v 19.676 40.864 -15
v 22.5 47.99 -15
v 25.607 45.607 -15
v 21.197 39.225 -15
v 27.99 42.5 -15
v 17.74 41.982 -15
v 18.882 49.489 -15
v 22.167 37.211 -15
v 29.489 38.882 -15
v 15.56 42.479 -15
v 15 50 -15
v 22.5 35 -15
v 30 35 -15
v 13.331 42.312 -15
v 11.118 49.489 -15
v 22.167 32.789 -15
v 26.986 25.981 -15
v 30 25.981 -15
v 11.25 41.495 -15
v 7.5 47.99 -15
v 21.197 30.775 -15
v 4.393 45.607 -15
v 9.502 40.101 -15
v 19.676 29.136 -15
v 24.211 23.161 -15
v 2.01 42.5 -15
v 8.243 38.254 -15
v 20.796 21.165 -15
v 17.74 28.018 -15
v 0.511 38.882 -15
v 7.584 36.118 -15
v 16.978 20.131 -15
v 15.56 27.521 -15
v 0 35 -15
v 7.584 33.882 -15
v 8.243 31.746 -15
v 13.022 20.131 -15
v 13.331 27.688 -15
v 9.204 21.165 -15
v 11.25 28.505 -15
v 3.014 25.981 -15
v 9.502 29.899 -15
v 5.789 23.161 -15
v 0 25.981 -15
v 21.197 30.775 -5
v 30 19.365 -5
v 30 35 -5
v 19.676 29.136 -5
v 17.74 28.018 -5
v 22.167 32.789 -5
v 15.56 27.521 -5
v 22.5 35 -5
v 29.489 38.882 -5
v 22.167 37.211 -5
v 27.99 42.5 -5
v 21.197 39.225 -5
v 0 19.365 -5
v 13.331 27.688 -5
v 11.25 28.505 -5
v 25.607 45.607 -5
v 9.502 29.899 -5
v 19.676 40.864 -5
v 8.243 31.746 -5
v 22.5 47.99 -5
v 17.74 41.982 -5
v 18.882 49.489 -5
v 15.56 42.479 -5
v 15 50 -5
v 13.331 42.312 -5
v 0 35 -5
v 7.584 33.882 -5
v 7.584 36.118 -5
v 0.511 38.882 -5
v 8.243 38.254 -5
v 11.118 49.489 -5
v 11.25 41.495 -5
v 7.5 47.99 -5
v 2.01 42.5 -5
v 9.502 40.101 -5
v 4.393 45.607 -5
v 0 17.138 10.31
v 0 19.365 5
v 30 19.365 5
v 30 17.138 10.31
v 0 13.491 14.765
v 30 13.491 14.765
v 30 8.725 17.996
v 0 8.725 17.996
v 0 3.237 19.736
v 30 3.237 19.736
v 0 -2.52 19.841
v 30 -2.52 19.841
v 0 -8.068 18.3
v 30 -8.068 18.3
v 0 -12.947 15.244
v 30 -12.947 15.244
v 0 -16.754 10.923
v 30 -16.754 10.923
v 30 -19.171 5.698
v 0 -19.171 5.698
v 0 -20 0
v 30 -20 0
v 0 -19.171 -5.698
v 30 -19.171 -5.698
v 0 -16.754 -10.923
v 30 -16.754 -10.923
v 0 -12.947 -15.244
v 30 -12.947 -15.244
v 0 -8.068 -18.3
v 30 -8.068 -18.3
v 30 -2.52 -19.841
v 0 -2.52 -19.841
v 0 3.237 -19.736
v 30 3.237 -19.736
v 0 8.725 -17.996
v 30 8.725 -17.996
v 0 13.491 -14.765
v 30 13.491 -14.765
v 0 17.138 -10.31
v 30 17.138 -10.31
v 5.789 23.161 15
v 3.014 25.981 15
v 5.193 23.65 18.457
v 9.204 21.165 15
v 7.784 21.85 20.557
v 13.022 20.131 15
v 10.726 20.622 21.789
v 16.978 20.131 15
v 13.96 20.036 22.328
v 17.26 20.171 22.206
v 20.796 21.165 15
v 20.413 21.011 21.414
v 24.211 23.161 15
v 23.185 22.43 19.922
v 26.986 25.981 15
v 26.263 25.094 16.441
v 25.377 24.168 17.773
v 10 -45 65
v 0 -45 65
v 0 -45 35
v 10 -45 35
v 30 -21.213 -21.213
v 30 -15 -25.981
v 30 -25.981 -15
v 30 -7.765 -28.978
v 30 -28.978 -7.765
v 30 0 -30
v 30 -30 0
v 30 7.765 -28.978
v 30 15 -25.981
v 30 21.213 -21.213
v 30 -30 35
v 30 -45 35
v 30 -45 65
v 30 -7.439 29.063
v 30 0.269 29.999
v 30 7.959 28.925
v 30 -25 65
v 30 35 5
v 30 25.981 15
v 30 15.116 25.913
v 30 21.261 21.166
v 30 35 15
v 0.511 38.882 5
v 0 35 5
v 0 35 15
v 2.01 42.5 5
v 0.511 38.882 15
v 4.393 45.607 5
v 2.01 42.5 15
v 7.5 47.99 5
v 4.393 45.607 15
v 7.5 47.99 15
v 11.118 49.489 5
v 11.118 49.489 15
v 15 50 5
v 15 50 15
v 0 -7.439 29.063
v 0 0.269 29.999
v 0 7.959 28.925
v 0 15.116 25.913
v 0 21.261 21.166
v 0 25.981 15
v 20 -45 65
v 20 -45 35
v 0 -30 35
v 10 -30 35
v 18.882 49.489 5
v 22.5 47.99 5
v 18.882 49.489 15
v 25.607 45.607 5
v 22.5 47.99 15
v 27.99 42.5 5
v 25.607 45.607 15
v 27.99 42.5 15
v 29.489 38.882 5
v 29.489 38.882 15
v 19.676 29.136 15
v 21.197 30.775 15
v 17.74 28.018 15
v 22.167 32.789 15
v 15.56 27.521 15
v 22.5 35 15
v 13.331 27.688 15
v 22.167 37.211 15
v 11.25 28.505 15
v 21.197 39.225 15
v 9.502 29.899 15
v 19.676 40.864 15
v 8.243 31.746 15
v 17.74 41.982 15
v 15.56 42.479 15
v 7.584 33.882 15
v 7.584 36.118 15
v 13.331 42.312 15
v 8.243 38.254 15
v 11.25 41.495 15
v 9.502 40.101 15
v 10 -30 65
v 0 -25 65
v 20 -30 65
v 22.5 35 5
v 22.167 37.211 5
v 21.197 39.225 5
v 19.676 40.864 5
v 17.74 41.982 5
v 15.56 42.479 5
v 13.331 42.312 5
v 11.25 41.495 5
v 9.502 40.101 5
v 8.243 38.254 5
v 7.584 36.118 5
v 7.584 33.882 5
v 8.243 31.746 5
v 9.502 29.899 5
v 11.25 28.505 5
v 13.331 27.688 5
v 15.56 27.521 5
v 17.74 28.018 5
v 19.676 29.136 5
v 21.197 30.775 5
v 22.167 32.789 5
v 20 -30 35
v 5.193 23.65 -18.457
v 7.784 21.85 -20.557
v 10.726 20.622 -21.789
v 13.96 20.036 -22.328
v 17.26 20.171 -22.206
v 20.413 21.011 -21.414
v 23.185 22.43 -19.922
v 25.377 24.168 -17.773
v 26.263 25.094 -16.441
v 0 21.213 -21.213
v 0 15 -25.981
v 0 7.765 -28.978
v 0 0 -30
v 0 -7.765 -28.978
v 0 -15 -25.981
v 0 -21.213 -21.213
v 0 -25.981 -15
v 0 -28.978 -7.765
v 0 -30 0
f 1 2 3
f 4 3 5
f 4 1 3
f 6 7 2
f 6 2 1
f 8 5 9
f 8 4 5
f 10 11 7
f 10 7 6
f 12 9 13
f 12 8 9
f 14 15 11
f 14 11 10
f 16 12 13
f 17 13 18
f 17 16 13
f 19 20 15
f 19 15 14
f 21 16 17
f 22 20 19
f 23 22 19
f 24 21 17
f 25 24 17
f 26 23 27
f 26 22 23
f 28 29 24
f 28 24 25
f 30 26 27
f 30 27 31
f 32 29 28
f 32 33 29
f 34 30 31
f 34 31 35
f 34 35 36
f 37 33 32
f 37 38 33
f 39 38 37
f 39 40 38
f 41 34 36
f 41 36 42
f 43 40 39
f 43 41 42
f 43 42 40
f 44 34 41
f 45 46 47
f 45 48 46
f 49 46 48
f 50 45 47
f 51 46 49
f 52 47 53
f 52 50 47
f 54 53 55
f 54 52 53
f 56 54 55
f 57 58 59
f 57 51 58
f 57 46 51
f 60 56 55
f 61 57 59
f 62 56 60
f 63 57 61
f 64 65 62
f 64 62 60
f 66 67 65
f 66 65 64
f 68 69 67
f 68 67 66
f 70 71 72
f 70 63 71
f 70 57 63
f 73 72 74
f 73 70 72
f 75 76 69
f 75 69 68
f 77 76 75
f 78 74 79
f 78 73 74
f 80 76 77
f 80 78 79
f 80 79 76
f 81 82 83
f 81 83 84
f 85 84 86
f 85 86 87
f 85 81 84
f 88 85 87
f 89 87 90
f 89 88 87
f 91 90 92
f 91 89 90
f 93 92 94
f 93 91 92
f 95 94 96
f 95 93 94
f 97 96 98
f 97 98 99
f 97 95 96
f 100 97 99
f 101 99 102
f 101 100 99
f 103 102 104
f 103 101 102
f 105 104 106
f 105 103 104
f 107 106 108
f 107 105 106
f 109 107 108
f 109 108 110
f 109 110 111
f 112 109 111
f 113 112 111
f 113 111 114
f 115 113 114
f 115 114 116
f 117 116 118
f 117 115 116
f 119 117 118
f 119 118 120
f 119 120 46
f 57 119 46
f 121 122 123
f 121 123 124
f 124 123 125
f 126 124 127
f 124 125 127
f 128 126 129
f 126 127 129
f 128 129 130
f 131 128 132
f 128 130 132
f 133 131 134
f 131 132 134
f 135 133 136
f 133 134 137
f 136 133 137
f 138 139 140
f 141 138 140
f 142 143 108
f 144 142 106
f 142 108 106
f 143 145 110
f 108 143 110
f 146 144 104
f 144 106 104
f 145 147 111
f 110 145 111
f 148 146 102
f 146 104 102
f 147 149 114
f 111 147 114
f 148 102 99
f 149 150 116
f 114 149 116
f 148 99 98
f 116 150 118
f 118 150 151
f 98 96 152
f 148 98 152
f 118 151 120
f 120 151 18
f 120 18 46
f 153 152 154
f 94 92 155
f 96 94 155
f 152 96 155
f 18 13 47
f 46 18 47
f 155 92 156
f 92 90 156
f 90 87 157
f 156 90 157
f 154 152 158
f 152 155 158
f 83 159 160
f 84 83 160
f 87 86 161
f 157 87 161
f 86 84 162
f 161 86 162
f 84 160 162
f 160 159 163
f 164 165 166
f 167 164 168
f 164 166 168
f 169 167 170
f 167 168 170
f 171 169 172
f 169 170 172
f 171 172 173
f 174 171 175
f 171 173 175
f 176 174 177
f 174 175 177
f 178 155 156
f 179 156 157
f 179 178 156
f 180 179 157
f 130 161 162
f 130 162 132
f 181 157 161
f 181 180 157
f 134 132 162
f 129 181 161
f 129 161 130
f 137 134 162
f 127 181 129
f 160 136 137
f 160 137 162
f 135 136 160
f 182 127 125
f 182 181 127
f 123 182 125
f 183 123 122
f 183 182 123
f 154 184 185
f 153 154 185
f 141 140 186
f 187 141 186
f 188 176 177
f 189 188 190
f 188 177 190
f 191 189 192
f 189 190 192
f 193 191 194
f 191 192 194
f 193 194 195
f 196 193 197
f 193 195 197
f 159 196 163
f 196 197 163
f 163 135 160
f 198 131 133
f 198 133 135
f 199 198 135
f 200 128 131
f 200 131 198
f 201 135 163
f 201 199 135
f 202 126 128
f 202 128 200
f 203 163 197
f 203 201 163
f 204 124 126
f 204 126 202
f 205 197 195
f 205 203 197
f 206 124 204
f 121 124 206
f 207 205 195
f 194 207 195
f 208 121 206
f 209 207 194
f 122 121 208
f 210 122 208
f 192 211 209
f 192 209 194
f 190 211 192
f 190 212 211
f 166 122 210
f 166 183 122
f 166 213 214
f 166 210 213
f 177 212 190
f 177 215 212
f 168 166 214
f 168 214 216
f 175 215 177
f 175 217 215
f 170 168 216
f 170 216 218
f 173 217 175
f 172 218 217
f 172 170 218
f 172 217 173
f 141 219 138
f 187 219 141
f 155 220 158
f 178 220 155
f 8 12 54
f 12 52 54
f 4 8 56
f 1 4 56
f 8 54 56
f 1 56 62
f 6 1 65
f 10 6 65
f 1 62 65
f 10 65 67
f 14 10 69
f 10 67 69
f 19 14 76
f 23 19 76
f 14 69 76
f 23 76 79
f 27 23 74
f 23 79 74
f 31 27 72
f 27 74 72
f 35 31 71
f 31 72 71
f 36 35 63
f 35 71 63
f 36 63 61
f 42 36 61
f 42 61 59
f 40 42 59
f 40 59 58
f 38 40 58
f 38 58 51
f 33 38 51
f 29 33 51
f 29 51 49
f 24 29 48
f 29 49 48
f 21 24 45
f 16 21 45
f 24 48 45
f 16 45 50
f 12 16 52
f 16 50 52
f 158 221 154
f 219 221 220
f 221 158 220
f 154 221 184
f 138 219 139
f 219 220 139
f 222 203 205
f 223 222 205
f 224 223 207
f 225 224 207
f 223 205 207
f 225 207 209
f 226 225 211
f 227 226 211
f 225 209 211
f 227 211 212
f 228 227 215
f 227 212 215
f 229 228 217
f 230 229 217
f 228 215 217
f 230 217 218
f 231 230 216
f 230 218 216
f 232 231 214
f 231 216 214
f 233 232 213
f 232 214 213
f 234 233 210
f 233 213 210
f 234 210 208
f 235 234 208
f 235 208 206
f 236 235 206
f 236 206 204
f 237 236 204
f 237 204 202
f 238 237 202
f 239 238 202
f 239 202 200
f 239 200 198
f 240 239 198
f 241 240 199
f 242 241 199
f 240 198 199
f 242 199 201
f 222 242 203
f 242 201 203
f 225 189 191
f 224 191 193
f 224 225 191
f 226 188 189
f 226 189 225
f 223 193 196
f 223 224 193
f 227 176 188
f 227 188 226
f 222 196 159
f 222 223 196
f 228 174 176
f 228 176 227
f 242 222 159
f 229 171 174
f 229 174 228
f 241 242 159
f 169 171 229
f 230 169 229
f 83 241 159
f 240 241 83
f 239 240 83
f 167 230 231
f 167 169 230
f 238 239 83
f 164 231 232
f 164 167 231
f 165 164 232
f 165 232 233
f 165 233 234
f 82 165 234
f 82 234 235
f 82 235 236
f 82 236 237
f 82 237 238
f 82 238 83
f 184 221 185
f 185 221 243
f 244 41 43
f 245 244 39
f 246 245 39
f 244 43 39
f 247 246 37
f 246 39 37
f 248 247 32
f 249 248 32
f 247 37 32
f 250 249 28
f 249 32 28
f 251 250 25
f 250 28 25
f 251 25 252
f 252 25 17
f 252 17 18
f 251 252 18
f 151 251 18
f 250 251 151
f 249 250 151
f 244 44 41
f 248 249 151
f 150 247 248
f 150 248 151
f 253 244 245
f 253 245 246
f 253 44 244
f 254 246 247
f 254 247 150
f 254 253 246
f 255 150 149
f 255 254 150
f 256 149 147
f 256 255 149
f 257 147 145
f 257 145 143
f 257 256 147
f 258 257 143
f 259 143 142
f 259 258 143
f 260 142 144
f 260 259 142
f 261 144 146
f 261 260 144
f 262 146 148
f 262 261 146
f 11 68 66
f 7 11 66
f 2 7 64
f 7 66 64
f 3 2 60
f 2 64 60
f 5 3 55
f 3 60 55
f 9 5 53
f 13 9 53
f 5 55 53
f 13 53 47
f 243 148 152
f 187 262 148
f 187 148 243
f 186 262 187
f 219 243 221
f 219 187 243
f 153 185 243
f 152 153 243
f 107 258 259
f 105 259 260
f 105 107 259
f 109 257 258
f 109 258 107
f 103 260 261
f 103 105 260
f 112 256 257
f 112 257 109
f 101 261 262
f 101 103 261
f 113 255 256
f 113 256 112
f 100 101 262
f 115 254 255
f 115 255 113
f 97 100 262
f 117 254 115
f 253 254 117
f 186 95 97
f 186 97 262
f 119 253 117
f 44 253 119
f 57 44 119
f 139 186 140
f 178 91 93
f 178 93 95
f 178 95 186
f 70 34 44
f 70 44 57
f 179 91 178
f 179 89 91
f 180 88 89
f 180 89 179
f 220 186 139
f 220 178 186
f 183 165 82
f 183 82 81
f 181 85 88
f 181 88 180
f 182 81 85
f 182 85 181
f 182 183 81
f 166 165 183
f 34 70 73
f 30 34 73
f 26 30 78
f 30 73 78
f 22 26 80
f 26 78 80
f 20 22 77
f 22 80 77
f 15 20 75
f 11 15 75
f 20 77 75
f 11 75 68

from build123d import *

# Parameters (mm, degrees)
SKETCH1_W           = 30
SKETCH1_H           = 15
BOSS_EXTRUDE1_DEPTH = 30
CUT_EXTRUDE1_DEPTH  = 15
SKETCH4_3_R         = 7.5
CUT_EXTRUDE2_DEPTH  = 15
CUT_EXTRUDE3_START  = 35
SKETCH4_4_R         = 15
SKETCH4_4_R_2       = 7.5
CUT_EXTRUDE3_DEPTH  = 20
CUT_EXTRUDE4_START  = -15
SKETCH4_5_R         = 15
SKETCH4_5_R_2       = 7.5
CUT_EXTRUDE4_DEPTH  = 20
CUT_EXTRUDE5_START  = 10
SKETCH1_3_W         = 30
SKETCH1_3_H         = 15
CUT_EXTRUDE5_DEPTH  = 10


with BuildPart() as part:
    # Sketch1 → Boss-Extrude1 (new body)
    with BuildSketch(Plane(origin=(0, 0, 0), x_dir=(0, 0, -1), z_dir=(1, 0, 0))):
        with BuildLine():
            Line((0, -30), (-65, -30))
            Line((-65, -30), (-65, -25))
            Line((-65, -25), (-29.063054532, -7.439009429))
            ThreePointArc((-29.063054532, -7.439009429), (-27.651554679, 11.635786344), (-15, 25.980762114))
            Line((-15, 25.980762114), (-15, 50))
            Line((-15, 50), (-5, 50))
            Line((-5, 50), (-5, 19.364916731))
            ThreePointArc((-5, 19.364916731), (0, -20), (5, 19.364916731))
            Line((5, 19.364916731), (5, 50))
            Line((5, 50), (15, 50))
            Line((15, 50), (15, 25.980762114))
            ThreePointArc((15, 25.980762114), (28.977774789, -7.764571353), (0, -30))
        make_face()
        with Locations((-50, -37.5)):
            Rectangle(SKETCH1_W, SKETCH1_H)
    extrude(amount=BOSS_EXTRUDE1_DEPTH)

    # Sketch4 → Cut-Extrude1 (cut, symmetric)
    with BuildSketch(Plane.XY):
        with BuildLine():
            ThreePointArc((0, 35), (4.393398282, 45.606601718), (15, 50))
            Line((15, 50), (0, 50))
            Line((0, 50), (0, 35))
        make_face()
        with BuildLine():
            Line((30, 50), (15, 50))
            ThreePointArc((15, 50), (25.606601718, 45.606601718), (30, 35))
            Line((30, 35), (30, 50))
        make_face()
    extrude(amount=CUT_EXTRUDE1_DEPTH, both=True, mode=Mode.SUBTRACT)

    # Sketch4<3> → Cut-Extrude2 (cut, symmetric)
    with BuildSketch(Plane.XY):
        with Locations((15, 35)):
            Circle(SKETCH4_3_R)
    extrude(amount=CUT_EXTRUDE2_DEPTH, both=True, mode=Mode.SUBTRACT)

    # Sketch4<4> → Cut-Extrude3 (cut)
    with BuildSketch(Plane.XY.offset(CUT_EXTRUDE3_START)):
        with Locations((15, 35)):
            Circle(SKETCH4_4_R)
        with Locations((15, 35)):
            Circle(SKETCH4_4_R_2, mode=Mode.SUBTRACT)
    extrude(amount=-CUT_EXTRUDE3_DEPTH, mode=Mode.SUBTRACT)

    # Sketch4<5> → Cut-Extrude4 (cut)
    with BuildSketch(Plane.XY.offset(CUT_EXTRUDE4_START)):
        with Locations((15, 35)):
            Circle(SKETCH4_5_R)
        with Locations((15, 35)):
            Circle(SKETCH4_5_R_2, mode=Mode.SUBTRACT)
    extrude(amount=-CUT_EXTRUDE4_DEPTH, mode=Mode.SUBTRACT)

    # Sketch1<3> → Cut-Extrude5 (cut)
    with BuildSketch(Plane(origin=(0, 0, 0), x_dir=(0, 0, -1), z_dir=(1, 0, 0)).offset(CUT_EXTRUDE5_START)):
        with Locations((-50, -37.5)):
            Rectangle(SKETCH1_3_W, SKETCH1_3_H)
    extrude(amount=CUT_EXTRUDE5_DEPTH, mode=Mode.SUBTRACT)


solid = part.part
